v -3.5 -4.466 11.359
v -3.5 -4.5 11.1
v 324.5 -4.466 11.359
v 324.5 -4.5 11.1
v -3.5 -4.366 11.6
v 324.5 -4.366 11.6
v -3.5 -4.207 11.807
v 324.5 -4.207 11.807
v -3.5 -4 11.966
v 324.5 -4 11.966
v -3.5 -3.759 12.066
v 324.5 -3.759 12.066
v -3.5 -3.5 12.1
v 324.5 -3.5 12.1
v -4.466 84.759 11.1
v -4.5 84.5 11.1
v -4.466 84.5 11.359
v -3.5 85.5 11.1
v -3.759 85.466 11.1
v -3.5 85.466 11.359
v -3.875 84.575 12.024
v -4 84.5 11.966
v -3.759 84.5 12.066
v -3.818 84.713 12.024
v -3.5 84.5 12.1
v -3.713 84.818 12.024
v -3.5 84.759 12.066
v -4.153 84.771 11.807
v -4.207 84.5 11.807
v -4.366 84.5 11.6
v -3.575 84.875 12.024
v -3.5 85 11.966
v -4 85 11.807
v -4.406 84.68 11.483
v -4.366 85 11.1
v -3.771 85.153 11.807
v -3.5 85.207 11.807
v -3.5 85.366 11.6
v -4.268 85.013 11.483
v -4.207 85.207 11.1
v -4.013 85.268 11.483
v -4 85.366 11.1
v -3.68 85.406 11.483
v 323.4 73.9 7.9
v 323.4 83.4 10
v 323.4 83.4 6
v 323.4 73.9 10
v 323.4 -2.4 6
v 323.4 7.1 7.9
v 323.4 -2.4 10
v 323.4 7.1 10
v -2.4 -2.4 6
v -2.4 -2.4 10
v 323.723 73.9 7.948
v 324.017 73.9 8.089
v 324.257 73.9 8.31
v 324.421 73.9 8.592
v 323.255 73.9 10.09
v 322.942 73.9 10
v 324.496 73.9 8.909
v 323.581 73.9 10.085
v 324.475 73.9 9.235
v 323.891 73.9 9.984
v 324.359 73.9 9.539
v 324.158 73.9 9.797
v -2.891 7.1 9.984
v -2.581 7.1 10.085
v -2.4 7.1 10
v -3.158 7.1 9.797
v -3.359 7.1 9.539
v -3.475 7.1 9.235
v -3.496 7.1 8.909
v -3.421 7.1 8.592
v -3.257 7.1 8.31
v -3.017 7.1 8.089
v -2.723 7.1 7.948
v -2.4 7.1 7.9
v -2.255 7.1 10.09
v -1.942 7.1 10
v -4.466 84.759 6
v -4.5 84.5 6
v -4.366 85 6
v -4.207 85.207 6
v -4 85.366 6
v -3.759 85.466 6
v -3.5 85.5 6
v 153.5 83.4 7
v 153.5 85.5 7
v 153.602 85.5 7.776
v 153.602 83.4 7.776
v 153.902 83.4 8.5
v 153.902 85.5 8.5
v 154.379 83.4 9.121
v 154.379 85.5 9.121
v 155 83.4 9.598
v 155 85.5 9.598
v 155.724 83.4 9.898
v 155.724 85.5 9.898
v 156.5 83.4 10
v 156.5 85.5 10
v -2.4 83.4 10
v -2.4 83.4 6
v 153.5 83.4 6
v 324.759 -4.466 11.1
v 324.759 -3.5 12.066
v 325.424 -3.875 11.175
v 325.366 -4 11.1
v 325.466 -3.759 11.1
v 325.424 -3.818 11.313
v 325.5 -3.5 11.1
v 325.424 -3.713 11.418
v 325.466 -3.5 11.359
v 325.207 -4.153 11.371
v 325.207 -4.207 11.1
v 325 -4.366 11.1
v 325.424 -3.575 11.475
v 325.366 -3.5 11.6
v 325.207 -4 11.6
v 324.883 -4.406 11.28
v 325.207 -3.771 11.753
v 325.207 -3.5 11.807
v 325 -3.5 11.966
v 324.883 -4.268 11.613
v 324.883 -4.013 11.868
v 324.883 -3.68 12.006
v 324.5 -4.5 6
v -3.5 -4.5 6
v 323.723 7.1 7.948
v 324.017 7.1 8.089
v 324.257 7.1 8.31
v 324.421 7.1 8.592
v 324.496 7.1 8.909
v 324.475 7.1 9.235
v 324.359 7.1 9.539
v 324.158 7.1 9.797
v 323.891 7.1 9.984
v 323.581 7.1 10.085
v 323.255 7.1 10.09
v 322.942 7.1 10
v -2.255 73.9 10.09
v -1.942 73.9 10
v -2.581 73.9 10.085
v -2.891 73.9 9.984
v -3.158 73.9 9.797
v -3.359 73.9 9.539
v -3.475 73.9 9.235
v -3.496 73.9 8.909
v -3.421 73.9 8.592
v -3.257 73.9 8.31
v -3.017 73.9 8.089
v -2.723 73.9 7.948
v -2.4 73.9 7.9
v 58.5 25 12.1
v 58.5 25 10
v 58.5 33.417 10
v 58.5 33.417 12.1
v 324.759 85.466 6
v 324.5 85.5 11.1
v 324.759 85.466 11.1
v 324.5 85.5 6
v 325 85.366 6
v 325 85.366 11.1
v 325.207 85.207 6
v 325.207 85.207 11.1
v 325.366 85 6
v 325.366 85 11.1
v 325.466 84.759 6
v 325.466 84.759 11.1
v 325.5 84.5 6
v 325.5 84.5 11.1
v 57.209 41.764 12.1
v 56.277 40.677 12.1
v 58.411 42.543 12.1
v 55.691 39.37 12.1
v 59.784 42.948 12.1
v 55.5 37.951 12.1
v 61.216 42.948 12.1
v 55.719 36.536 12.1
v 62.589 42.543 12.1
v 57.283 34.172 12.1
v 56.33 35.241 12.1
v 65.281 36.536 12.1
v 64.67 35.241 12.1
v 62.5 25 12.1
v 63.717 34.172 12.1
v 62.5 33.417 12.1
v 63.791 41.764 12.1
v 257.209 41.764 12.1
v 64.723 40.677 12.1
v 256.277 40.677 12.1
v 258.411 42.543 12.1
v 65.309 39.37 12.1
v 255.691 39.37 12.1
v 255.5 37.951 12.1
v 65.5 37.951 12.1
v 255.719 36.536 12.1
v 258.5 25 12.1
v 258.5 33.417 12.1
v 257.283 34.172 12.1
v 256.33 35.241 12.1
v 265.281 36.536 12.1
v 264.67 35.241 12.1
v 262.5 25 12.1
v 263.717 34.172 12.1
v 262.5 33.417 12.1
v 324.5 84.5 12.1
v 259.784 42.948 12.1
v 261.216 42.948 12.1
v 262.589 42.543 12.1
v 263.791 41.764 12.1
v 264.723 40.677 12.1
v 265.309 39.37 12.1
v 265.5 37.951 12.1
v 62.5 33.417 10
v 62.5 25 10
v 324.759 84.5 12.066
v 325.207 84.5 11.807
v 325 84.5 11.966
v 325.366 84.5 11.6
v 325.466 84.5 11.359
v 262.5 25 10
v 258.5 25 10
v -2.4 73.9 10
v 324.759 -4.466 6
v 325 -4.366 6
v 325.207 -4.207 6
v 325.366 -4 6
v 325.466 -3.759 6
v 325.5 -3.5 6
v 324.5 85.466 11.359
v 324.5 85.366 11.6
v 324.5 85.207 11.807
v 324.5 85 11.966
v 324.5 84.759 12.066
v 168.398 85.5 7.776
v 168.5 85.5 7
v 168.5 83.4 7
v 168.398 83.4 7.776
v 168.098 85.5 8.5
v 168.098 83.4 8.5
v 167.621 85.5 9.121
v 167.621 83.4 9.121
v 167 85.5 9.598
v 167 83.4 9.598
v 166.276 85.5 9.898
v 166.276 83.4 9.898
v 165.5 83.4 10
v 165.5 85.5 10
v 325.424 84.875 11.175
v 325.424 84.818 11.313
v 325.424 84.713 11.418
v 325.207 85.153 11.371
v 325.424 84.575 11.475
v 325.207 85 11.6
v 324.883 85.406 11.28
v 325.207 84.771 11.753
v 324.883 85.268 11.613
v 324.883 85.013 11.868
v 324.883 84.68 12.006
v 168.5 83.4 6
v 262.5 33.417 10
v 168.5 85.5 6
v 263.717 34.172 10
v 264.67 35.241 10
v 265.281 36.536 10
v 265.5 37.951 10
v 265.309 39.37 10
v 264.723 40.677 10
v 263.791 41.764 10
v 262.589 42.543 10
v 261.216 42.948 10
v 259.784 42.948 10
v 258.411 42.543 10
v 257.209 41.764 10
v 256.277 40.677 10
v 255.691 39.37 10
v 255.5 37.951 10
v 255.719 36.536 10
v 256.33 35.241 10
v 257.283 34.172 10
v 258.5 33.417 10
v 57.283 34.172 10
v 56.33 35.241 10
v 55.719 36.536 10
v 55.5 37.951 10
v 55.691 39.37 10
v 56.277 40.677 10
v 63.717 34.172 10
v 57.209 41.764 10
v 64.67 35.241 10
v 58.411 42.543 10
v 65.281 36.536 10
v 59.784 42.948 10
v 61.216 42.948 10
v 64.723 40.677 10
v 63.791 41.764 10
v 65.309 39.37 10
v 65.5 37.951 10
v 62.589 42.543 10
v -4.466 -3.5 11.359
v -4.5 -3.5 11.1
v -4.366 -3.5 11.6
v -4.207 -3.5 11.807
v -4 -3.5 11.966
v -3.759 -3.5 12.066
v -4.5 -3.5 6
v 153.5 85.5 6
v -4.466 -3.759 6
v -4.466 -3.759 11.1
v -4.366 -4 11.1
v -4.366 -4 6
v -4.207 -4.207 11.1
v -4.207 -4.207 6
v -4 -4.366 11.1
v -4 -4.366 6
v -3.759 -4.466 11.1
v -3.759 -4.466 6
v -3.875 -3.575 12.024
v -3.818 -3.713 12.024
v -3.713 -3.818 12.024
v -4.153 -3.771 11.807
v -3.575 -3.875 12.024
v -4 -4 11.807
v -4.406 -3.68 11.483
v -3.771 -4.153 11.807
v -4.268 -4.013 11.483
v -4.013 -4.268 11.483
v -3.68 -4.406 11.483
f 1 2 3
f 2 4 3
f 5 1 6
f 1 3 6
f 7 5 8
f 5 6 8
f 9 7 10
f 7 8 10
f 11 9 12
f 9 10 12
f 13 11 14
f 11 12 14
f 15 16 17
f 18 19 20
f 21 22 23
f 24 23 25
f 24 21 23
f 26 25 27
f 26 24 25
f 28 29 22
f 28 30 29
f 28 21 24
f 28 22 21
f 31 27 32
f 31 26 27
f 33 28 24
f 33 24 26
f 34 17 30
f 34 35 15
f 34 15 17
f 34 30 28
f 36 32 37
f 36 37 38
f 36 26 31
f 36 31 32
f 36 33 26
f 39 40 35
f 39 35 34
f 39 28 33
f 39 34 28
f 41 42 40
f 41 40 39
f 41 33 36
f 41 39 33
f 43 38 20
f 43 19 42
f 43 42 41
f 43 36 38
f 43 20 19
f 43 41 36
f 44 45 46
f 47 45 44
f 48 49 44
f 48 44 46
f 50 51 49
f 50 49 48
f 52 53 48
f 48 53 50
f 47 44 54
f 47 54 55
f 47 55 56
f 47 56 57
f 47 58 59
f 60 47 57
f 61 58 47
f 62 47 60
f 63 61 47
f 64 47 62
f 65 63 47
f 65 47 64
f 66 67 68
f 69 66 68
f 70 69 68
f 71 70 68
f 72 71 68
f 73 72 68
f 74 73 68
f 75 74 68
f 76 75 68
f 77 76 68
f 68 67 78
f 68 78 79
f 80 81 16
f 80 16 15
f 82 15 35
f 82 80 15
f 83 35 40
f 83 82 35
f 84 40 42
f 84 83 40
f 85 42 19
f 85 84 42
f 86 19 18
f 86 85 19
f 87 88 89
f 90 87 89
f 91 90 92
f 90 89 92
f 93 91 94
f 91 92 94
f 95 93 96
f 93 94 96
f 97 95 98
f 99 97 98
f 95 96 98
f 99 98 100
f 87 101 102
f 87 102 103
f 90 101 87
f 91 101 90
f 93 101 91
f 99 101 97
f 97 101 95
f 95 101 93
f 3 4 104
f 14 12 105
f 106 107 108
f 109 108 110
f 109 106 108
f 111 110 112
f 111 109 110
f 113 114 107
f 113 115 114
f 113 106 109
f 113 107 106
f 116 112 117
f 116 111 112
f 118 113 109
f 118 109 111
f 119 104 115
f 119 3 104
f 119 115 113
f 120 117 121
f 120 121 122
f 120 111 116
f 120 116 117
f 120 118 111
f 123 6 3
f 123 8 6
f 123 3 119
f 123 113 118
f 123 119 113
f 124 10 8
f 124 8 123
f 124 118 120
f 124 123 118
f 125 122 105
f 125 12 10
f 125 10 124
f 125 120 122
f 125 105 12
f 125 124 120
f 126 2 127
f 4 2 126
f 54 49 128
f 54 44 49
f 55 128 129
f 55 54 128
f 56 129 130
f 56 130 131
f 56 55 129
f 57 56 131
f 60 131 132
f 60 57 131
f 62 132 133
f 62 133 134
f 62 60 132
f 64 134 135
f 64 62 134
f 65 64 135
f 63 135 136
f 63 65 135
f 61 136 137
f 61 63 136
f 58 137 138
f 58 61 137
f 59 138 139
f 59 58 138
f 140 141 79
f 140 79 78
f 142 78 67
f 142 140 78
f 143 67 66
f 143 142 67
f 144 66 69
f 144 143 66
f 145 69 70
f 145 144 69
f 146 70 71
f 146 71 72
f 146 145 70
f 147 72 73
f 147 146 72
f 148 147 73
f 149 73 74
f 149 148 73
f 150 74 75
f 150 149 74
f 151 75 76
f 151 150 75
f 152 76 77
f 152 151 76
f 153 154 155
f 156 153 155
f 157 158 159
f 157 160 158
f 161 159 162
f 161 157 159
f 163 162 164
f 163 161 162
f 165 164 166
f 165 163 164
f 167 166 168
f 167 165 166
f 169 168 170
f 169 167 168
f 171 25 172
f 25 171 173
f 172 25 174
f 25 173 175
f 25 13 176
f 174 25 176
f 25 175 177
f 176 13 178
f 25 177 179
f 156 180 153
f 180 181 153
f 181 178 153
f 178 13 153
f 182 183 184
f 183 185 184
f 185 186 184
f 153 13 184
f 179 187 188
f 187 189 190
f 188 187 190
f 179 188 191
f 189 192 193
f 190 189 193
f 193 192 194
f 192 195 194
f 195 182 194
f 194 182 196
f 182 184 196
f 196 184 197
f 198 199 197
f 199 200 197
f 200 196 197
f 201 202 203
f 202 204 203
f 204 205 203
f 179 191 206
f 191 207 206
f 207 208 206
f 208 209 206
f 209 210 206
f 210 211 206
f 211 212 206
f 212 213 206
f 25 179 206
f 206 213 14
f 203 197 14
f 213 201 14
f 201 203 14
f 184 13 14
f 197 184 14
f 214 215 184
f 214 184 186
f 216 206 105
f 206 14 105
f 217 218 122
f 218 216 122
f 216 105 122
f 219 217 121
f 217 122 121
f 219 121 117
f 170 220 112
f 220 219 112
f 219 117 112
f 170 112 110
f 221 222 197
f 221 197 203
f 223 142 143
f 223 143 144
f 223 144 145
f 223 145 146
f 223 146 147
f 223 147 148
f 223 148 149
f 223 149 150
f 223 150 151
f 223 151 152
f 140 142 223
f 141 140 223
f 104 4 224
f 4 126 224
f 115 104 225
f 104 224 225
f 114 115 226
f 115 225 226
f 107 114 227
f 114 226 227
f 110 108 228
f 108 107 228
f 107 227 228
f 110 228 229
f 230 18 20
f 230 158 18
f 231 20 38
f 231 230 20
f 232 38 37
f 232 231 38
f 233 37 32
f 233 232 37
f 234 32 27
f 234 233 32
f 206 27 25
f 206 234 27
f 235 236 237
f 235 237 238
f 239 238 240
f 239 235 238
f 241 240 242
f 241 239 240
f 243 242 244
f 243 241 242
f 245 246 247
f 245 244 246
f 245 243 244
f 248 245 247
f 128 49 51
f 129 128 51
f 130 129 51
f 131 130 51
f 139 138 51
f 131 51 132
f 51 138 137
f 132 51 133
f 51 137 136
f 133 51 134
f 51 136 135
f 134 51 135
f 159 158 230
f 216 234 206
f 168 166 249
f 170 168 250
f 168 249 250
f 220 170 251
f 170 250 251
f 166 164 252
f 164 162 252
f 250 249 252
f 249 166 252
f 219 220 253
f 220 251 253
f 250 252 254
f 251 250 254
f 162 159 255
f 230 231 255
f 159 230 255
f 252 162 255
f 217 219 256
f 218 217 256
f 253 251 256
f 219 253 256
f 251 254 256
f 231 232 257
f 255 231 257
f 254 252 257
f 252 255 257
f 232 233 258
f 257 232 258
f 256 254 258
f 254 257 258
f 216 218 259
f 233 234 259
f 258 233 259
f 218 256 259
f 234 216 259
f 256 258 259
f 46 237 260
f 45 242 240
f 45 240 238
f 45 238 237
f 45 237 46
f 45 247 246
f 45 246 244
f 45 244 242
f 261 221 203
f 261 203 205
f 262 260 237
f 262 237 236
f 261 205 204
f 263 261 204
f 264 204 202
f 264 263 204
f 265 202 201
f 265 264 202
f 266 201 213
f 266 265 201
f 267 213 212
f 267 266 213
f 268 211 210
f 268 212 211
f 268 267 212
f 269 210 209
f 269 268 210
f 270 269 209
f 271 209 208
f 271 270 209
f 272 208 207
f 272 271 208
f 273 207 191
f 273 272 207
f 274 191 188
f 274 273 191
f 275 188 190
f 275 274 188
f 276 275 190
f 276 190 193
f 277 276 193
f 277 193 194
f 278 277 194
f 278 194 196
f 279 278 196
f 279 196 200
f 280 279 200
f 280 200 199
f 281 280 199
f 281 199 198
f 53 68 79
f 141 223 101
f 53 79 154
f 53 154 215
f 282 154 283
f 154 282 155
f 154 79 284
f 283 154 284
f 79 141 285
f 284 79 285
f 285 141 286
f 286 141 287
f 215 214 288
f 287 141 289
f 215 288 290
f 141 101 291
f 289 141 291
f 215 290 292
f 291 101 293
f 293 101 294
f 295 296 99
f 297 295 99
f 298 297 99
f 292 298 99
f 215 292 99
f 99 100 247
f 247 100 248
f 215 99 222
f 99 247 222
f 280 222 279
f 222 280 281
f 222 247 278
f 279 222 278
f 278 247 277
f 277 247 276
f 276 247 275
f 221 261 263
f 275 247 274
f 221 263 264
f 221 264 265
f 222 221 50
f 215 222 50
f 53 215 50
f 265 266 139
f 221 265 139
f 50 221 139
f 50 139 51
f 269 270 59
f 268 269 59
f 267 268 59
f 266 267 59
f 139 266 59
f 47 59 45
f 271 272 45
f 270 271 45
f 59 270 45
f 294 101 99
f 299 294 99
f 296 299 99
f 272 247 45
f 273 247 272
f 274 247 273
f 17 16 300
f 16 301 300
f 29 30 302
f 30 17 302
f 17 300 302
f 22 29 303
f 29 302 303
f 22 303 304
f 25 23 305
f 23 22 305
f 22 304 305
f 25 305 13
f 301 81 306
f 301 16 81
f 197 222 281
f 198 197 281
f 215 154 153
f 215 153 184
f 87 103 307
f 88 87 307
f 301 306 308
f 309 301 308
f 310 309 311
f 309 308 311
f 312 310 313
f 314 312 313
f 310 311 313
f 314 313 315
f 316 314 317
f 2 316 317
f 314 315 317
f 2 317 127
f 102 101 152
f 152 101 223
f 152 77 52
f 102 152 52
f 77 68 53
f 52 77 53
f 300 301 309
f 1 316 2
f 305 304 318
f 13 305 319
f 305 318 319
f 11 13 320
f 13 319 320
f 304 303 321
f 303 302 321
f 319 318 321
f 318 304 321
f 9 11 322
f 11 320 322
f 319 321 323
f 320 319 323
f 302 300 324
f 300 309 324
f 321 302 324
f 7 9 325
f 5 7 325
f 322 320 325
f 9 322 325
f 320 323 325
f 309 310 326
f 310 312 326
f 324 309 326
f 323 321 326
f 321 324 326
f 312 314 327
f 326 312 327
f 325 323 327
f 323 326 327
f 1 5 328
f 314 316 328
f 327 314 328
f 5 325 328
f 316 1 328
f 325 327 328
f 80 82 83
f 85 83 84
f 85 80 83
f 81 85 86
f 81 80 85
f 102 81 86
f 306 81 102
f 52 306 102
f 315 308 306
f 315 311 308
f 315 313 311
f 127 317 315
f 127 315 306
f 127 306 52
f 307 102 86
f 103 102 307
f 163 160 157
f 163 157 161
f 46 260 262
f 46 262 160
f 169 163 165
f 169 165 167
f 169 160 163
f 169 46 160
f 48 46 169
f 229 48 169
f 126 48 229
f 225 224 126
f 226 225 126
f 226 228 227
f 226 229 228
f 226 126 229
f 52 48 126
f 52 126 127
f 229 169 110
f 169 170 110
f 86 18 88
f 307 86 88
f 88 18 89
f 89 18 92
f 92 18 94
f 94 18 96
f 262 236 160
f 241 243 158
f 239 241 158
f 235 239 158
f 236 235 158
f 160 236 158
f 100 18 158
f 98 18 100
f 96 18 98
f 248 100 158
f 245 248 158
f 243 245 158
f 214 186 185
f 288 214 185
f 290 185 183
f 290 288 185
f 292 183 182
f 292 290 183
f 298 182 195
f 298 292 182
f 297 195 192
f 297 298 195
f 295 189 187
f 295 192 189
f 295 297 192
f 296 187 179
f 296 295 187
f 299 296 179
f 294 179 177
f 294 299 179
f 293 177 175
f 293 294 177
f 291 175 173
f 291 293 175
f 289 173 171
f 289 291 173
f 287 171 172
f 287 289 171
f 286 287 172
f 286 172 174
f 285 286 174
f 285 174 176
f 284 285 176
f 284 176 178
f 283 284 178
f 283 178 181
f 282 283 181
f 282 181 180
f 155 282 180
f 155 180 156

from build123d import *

# Parameters (mm, degrees)
BOX004_W                  = 4
BOX004_H                  = 10
BOX004_DEPTH              = 10
CYLINDER002_R             = 5
CYLINDER002_DEPTH         = 10
BOX003_W                  = 4
BOX003_H                  = 10
BOX003_DEPTH              = 10
CYLINDER001_R             = 5
CYLINDER001_DEPTH         = 10
BOX001_W                  = 15
BOX001_H                  = 10
BOX001_DEPTH              = 8
FILLET002_R               = 3
LID_GROOVE_LEFT_R         = 1.1
LID_GROOVE_LEFT_DEPTH     = 66.8
LID_GROOVE_RIGHT_R        = 1.1
LID_GROOVE_RIGHT_DEPTH    = 66.8
LID_INSIDE_W              = 325.8
LID_INSIDE_H              = 85.8
LID_INSIDE_DEPTH          = 4
LID_OUTSIDE_W             = 330
LID_OUTSIDE_H             = 90
LID_OUTSIDE_DEPTH         = 6.1
FILLET001_R               = 1
FILLET001_PLACEMENT_ANGLE = 180


with BuildPart() as cube003:
    # Box004 → Box004 (new body)
    with BuildSketch(Plane.XY):
        with Locations((2, 5)):
            Rectangle(BOX004_W, BOX004_H)
    extrude(amount=BOX004_DEPTH)


with BuildPart() as fusion002:
    # Cylinder002 → Cylinder002 (new body)
    with BuildSketch(Plane(origin=(2, 13, 0), x_dir=(1, 0, 0), z_dir=(0, 0, 1))):
        Circle(CYLINDER002_R)
    extrude(amount=CYLINDER002_DEPTH)

    # Fusion002: union Cube003
    add(cube003.part)


with BuildPart() as fusion002_1:
    # Fusion002 placement: moved
    add(fusion002.part.moved(Location((258.5, 25, 8))))


with BuildPart() as cube002:
    # Box003 → Box003 (new body)
    with BuildSketch(Plane.XY):
        with Locations((2, 5)):
            Rectangle(BOX003_W, BOX003_H)
    extrude(amount=BOX003_DEPTH)


with BuildPart() as fusion001:
    # Cylinder001 → Cylinder001 (new body)
    with BuildSketch(Plane(origin=(2, 13, 0), x_dir=(1, 0, 0), z_dir=(0, 0, 1))):
        Circle(CYLINDER001_R)
    extrude(amount=CYLINDER001_DEPTH)

    # Fusion001: union Cube002
    add(cube002.part)


with BuildPart() as fusion001_1:
    # Fusion001 placement: moved
    add(fusion001.part.moved(Location((58.5, 25, 8))))


with BuildPart() as fillet002:
    # Box001 → Box001 (new body)
    with BuildSketch(Plane(origin=(153.5, 80, 2), x_dir=(1, 0, 0), z_dir=(0, 0, 1))):
        with Locations((7.5, 5)):
            Rectangle(BOX001_W, BOX001_H)
    extrude(amount=BOX001_DEPTH)

    # Fillet002
    fillet002_edges = [fillet002.edges().sort_by_distance(p)[0] for p in [
        (153.5, 85, 10),
        (153.5, 85, 2),
        (168.5, 85, 10),
        (168.5, 85, 2),
    ]]
    fillet(fillet002_edges, radius=FILLET002_R)


with BuildPart() as lid_groove_left:
    # lid_groove_left → lid_groove_left (new body)
    with BuildSketch(Plane(origin=(-2.4, 7.1, 1), x_dir=(1, 0, 0), z_dir=(0, 1, 0))):
        Circle(LID_GROOVE_LEFT_R)
    extrude(amount=LID_GROOVE_LEFT_DEPTH)


with BuildPart() as lid_groove_right:
    # lid_groove_right → lid_groove_right (new body)
    with BuildSketch(Plane(origin=(323.4, 7.1, 1), x_dir=(1, 0, 0), z_dir=(0, 1, 0))):
        Circle(LID_GROOVE_RIGHT_R)
    extrude(amount=LID_GROOVE_RIGHT_DEPTH)


with BuildPart() as lid_inside:
    # lid_inside → lid_inside (new body)
    with BuildSketch(Plane(origin=(-2.4, -2.4, 0), x_dir=(1, 0, 0), z_dir=(0, 0, 1))):
        with Locations((162.9, 42.9)):
            Rectangle(LID_INSIDE_W, LID_INSIDE_H)
    extrude(amount=LID_INSIDE_DEPTH)


with BuildPart() as lid002:
    # lid_outside → lid_outside (new body)
    with BuildSketch(Plane(origin=(-4.5, -4.5, -2.1), x_dir=(1, 0, 0), z_dir=(0, 0, 1))):
        with Locations((165, 45)):
            Rectangle(LID_OUTSIDE_W, LID_OUTSIDE_H)
    extrude(amount=LID_OUTSIDE_DEPTH)

    # Cut001: cut lid_inside
    add(lid_inside.part, mode=Mode.SUBTRACT)

    # Cut002: cut lid_groove_right
    add(lid_groove_right.part, mode=Mode.SUBTRACT)

    # Cut003: cut lid_groove_left
    add(lid_groove_left.part, mode=Mode.SUBTRACT)

    # Fillet001
    fillet001_edges = [lid002.edges().sort_by_distance(p)[0] for p in [
        (-4.5, -4.5, 0.95),
        (-4.5, 85.5, 0.95),
        (-4.5, 40.5, -2.1),
        (160.5, -4.5, -2.1),
        (325.5, -4.5, 0.95),
        (160.5, 85.5, -2.1),
        (325.5, 85.5, 0.95),
        (325.5, 40.5, -2.1),
    ]]
    fillet(fillet001_edges, radius=FILLET001_R)


with BuildPart() as lid002_1:
    # Fillet001 placement: moved
    add(lid002.part.moved(Location((0, 81, 10))).rotate(Axis((0, 81, 10), (1, 0, 0)), FILLET001_PLACEMENT_ANGLE))

    # Cut004: cut Fillet002
    add(fillet002.part, mode=Mode.SUBTRACT)

    # Cut007: cut Fusion001
    add(fusion001_1.part, mode=Mode.SUBTRACT)

    # Cut008: cut Fusion002
    add(fusion002_1.part, mode=Mode.SUBTRACT)


solid = lid002_1.part
